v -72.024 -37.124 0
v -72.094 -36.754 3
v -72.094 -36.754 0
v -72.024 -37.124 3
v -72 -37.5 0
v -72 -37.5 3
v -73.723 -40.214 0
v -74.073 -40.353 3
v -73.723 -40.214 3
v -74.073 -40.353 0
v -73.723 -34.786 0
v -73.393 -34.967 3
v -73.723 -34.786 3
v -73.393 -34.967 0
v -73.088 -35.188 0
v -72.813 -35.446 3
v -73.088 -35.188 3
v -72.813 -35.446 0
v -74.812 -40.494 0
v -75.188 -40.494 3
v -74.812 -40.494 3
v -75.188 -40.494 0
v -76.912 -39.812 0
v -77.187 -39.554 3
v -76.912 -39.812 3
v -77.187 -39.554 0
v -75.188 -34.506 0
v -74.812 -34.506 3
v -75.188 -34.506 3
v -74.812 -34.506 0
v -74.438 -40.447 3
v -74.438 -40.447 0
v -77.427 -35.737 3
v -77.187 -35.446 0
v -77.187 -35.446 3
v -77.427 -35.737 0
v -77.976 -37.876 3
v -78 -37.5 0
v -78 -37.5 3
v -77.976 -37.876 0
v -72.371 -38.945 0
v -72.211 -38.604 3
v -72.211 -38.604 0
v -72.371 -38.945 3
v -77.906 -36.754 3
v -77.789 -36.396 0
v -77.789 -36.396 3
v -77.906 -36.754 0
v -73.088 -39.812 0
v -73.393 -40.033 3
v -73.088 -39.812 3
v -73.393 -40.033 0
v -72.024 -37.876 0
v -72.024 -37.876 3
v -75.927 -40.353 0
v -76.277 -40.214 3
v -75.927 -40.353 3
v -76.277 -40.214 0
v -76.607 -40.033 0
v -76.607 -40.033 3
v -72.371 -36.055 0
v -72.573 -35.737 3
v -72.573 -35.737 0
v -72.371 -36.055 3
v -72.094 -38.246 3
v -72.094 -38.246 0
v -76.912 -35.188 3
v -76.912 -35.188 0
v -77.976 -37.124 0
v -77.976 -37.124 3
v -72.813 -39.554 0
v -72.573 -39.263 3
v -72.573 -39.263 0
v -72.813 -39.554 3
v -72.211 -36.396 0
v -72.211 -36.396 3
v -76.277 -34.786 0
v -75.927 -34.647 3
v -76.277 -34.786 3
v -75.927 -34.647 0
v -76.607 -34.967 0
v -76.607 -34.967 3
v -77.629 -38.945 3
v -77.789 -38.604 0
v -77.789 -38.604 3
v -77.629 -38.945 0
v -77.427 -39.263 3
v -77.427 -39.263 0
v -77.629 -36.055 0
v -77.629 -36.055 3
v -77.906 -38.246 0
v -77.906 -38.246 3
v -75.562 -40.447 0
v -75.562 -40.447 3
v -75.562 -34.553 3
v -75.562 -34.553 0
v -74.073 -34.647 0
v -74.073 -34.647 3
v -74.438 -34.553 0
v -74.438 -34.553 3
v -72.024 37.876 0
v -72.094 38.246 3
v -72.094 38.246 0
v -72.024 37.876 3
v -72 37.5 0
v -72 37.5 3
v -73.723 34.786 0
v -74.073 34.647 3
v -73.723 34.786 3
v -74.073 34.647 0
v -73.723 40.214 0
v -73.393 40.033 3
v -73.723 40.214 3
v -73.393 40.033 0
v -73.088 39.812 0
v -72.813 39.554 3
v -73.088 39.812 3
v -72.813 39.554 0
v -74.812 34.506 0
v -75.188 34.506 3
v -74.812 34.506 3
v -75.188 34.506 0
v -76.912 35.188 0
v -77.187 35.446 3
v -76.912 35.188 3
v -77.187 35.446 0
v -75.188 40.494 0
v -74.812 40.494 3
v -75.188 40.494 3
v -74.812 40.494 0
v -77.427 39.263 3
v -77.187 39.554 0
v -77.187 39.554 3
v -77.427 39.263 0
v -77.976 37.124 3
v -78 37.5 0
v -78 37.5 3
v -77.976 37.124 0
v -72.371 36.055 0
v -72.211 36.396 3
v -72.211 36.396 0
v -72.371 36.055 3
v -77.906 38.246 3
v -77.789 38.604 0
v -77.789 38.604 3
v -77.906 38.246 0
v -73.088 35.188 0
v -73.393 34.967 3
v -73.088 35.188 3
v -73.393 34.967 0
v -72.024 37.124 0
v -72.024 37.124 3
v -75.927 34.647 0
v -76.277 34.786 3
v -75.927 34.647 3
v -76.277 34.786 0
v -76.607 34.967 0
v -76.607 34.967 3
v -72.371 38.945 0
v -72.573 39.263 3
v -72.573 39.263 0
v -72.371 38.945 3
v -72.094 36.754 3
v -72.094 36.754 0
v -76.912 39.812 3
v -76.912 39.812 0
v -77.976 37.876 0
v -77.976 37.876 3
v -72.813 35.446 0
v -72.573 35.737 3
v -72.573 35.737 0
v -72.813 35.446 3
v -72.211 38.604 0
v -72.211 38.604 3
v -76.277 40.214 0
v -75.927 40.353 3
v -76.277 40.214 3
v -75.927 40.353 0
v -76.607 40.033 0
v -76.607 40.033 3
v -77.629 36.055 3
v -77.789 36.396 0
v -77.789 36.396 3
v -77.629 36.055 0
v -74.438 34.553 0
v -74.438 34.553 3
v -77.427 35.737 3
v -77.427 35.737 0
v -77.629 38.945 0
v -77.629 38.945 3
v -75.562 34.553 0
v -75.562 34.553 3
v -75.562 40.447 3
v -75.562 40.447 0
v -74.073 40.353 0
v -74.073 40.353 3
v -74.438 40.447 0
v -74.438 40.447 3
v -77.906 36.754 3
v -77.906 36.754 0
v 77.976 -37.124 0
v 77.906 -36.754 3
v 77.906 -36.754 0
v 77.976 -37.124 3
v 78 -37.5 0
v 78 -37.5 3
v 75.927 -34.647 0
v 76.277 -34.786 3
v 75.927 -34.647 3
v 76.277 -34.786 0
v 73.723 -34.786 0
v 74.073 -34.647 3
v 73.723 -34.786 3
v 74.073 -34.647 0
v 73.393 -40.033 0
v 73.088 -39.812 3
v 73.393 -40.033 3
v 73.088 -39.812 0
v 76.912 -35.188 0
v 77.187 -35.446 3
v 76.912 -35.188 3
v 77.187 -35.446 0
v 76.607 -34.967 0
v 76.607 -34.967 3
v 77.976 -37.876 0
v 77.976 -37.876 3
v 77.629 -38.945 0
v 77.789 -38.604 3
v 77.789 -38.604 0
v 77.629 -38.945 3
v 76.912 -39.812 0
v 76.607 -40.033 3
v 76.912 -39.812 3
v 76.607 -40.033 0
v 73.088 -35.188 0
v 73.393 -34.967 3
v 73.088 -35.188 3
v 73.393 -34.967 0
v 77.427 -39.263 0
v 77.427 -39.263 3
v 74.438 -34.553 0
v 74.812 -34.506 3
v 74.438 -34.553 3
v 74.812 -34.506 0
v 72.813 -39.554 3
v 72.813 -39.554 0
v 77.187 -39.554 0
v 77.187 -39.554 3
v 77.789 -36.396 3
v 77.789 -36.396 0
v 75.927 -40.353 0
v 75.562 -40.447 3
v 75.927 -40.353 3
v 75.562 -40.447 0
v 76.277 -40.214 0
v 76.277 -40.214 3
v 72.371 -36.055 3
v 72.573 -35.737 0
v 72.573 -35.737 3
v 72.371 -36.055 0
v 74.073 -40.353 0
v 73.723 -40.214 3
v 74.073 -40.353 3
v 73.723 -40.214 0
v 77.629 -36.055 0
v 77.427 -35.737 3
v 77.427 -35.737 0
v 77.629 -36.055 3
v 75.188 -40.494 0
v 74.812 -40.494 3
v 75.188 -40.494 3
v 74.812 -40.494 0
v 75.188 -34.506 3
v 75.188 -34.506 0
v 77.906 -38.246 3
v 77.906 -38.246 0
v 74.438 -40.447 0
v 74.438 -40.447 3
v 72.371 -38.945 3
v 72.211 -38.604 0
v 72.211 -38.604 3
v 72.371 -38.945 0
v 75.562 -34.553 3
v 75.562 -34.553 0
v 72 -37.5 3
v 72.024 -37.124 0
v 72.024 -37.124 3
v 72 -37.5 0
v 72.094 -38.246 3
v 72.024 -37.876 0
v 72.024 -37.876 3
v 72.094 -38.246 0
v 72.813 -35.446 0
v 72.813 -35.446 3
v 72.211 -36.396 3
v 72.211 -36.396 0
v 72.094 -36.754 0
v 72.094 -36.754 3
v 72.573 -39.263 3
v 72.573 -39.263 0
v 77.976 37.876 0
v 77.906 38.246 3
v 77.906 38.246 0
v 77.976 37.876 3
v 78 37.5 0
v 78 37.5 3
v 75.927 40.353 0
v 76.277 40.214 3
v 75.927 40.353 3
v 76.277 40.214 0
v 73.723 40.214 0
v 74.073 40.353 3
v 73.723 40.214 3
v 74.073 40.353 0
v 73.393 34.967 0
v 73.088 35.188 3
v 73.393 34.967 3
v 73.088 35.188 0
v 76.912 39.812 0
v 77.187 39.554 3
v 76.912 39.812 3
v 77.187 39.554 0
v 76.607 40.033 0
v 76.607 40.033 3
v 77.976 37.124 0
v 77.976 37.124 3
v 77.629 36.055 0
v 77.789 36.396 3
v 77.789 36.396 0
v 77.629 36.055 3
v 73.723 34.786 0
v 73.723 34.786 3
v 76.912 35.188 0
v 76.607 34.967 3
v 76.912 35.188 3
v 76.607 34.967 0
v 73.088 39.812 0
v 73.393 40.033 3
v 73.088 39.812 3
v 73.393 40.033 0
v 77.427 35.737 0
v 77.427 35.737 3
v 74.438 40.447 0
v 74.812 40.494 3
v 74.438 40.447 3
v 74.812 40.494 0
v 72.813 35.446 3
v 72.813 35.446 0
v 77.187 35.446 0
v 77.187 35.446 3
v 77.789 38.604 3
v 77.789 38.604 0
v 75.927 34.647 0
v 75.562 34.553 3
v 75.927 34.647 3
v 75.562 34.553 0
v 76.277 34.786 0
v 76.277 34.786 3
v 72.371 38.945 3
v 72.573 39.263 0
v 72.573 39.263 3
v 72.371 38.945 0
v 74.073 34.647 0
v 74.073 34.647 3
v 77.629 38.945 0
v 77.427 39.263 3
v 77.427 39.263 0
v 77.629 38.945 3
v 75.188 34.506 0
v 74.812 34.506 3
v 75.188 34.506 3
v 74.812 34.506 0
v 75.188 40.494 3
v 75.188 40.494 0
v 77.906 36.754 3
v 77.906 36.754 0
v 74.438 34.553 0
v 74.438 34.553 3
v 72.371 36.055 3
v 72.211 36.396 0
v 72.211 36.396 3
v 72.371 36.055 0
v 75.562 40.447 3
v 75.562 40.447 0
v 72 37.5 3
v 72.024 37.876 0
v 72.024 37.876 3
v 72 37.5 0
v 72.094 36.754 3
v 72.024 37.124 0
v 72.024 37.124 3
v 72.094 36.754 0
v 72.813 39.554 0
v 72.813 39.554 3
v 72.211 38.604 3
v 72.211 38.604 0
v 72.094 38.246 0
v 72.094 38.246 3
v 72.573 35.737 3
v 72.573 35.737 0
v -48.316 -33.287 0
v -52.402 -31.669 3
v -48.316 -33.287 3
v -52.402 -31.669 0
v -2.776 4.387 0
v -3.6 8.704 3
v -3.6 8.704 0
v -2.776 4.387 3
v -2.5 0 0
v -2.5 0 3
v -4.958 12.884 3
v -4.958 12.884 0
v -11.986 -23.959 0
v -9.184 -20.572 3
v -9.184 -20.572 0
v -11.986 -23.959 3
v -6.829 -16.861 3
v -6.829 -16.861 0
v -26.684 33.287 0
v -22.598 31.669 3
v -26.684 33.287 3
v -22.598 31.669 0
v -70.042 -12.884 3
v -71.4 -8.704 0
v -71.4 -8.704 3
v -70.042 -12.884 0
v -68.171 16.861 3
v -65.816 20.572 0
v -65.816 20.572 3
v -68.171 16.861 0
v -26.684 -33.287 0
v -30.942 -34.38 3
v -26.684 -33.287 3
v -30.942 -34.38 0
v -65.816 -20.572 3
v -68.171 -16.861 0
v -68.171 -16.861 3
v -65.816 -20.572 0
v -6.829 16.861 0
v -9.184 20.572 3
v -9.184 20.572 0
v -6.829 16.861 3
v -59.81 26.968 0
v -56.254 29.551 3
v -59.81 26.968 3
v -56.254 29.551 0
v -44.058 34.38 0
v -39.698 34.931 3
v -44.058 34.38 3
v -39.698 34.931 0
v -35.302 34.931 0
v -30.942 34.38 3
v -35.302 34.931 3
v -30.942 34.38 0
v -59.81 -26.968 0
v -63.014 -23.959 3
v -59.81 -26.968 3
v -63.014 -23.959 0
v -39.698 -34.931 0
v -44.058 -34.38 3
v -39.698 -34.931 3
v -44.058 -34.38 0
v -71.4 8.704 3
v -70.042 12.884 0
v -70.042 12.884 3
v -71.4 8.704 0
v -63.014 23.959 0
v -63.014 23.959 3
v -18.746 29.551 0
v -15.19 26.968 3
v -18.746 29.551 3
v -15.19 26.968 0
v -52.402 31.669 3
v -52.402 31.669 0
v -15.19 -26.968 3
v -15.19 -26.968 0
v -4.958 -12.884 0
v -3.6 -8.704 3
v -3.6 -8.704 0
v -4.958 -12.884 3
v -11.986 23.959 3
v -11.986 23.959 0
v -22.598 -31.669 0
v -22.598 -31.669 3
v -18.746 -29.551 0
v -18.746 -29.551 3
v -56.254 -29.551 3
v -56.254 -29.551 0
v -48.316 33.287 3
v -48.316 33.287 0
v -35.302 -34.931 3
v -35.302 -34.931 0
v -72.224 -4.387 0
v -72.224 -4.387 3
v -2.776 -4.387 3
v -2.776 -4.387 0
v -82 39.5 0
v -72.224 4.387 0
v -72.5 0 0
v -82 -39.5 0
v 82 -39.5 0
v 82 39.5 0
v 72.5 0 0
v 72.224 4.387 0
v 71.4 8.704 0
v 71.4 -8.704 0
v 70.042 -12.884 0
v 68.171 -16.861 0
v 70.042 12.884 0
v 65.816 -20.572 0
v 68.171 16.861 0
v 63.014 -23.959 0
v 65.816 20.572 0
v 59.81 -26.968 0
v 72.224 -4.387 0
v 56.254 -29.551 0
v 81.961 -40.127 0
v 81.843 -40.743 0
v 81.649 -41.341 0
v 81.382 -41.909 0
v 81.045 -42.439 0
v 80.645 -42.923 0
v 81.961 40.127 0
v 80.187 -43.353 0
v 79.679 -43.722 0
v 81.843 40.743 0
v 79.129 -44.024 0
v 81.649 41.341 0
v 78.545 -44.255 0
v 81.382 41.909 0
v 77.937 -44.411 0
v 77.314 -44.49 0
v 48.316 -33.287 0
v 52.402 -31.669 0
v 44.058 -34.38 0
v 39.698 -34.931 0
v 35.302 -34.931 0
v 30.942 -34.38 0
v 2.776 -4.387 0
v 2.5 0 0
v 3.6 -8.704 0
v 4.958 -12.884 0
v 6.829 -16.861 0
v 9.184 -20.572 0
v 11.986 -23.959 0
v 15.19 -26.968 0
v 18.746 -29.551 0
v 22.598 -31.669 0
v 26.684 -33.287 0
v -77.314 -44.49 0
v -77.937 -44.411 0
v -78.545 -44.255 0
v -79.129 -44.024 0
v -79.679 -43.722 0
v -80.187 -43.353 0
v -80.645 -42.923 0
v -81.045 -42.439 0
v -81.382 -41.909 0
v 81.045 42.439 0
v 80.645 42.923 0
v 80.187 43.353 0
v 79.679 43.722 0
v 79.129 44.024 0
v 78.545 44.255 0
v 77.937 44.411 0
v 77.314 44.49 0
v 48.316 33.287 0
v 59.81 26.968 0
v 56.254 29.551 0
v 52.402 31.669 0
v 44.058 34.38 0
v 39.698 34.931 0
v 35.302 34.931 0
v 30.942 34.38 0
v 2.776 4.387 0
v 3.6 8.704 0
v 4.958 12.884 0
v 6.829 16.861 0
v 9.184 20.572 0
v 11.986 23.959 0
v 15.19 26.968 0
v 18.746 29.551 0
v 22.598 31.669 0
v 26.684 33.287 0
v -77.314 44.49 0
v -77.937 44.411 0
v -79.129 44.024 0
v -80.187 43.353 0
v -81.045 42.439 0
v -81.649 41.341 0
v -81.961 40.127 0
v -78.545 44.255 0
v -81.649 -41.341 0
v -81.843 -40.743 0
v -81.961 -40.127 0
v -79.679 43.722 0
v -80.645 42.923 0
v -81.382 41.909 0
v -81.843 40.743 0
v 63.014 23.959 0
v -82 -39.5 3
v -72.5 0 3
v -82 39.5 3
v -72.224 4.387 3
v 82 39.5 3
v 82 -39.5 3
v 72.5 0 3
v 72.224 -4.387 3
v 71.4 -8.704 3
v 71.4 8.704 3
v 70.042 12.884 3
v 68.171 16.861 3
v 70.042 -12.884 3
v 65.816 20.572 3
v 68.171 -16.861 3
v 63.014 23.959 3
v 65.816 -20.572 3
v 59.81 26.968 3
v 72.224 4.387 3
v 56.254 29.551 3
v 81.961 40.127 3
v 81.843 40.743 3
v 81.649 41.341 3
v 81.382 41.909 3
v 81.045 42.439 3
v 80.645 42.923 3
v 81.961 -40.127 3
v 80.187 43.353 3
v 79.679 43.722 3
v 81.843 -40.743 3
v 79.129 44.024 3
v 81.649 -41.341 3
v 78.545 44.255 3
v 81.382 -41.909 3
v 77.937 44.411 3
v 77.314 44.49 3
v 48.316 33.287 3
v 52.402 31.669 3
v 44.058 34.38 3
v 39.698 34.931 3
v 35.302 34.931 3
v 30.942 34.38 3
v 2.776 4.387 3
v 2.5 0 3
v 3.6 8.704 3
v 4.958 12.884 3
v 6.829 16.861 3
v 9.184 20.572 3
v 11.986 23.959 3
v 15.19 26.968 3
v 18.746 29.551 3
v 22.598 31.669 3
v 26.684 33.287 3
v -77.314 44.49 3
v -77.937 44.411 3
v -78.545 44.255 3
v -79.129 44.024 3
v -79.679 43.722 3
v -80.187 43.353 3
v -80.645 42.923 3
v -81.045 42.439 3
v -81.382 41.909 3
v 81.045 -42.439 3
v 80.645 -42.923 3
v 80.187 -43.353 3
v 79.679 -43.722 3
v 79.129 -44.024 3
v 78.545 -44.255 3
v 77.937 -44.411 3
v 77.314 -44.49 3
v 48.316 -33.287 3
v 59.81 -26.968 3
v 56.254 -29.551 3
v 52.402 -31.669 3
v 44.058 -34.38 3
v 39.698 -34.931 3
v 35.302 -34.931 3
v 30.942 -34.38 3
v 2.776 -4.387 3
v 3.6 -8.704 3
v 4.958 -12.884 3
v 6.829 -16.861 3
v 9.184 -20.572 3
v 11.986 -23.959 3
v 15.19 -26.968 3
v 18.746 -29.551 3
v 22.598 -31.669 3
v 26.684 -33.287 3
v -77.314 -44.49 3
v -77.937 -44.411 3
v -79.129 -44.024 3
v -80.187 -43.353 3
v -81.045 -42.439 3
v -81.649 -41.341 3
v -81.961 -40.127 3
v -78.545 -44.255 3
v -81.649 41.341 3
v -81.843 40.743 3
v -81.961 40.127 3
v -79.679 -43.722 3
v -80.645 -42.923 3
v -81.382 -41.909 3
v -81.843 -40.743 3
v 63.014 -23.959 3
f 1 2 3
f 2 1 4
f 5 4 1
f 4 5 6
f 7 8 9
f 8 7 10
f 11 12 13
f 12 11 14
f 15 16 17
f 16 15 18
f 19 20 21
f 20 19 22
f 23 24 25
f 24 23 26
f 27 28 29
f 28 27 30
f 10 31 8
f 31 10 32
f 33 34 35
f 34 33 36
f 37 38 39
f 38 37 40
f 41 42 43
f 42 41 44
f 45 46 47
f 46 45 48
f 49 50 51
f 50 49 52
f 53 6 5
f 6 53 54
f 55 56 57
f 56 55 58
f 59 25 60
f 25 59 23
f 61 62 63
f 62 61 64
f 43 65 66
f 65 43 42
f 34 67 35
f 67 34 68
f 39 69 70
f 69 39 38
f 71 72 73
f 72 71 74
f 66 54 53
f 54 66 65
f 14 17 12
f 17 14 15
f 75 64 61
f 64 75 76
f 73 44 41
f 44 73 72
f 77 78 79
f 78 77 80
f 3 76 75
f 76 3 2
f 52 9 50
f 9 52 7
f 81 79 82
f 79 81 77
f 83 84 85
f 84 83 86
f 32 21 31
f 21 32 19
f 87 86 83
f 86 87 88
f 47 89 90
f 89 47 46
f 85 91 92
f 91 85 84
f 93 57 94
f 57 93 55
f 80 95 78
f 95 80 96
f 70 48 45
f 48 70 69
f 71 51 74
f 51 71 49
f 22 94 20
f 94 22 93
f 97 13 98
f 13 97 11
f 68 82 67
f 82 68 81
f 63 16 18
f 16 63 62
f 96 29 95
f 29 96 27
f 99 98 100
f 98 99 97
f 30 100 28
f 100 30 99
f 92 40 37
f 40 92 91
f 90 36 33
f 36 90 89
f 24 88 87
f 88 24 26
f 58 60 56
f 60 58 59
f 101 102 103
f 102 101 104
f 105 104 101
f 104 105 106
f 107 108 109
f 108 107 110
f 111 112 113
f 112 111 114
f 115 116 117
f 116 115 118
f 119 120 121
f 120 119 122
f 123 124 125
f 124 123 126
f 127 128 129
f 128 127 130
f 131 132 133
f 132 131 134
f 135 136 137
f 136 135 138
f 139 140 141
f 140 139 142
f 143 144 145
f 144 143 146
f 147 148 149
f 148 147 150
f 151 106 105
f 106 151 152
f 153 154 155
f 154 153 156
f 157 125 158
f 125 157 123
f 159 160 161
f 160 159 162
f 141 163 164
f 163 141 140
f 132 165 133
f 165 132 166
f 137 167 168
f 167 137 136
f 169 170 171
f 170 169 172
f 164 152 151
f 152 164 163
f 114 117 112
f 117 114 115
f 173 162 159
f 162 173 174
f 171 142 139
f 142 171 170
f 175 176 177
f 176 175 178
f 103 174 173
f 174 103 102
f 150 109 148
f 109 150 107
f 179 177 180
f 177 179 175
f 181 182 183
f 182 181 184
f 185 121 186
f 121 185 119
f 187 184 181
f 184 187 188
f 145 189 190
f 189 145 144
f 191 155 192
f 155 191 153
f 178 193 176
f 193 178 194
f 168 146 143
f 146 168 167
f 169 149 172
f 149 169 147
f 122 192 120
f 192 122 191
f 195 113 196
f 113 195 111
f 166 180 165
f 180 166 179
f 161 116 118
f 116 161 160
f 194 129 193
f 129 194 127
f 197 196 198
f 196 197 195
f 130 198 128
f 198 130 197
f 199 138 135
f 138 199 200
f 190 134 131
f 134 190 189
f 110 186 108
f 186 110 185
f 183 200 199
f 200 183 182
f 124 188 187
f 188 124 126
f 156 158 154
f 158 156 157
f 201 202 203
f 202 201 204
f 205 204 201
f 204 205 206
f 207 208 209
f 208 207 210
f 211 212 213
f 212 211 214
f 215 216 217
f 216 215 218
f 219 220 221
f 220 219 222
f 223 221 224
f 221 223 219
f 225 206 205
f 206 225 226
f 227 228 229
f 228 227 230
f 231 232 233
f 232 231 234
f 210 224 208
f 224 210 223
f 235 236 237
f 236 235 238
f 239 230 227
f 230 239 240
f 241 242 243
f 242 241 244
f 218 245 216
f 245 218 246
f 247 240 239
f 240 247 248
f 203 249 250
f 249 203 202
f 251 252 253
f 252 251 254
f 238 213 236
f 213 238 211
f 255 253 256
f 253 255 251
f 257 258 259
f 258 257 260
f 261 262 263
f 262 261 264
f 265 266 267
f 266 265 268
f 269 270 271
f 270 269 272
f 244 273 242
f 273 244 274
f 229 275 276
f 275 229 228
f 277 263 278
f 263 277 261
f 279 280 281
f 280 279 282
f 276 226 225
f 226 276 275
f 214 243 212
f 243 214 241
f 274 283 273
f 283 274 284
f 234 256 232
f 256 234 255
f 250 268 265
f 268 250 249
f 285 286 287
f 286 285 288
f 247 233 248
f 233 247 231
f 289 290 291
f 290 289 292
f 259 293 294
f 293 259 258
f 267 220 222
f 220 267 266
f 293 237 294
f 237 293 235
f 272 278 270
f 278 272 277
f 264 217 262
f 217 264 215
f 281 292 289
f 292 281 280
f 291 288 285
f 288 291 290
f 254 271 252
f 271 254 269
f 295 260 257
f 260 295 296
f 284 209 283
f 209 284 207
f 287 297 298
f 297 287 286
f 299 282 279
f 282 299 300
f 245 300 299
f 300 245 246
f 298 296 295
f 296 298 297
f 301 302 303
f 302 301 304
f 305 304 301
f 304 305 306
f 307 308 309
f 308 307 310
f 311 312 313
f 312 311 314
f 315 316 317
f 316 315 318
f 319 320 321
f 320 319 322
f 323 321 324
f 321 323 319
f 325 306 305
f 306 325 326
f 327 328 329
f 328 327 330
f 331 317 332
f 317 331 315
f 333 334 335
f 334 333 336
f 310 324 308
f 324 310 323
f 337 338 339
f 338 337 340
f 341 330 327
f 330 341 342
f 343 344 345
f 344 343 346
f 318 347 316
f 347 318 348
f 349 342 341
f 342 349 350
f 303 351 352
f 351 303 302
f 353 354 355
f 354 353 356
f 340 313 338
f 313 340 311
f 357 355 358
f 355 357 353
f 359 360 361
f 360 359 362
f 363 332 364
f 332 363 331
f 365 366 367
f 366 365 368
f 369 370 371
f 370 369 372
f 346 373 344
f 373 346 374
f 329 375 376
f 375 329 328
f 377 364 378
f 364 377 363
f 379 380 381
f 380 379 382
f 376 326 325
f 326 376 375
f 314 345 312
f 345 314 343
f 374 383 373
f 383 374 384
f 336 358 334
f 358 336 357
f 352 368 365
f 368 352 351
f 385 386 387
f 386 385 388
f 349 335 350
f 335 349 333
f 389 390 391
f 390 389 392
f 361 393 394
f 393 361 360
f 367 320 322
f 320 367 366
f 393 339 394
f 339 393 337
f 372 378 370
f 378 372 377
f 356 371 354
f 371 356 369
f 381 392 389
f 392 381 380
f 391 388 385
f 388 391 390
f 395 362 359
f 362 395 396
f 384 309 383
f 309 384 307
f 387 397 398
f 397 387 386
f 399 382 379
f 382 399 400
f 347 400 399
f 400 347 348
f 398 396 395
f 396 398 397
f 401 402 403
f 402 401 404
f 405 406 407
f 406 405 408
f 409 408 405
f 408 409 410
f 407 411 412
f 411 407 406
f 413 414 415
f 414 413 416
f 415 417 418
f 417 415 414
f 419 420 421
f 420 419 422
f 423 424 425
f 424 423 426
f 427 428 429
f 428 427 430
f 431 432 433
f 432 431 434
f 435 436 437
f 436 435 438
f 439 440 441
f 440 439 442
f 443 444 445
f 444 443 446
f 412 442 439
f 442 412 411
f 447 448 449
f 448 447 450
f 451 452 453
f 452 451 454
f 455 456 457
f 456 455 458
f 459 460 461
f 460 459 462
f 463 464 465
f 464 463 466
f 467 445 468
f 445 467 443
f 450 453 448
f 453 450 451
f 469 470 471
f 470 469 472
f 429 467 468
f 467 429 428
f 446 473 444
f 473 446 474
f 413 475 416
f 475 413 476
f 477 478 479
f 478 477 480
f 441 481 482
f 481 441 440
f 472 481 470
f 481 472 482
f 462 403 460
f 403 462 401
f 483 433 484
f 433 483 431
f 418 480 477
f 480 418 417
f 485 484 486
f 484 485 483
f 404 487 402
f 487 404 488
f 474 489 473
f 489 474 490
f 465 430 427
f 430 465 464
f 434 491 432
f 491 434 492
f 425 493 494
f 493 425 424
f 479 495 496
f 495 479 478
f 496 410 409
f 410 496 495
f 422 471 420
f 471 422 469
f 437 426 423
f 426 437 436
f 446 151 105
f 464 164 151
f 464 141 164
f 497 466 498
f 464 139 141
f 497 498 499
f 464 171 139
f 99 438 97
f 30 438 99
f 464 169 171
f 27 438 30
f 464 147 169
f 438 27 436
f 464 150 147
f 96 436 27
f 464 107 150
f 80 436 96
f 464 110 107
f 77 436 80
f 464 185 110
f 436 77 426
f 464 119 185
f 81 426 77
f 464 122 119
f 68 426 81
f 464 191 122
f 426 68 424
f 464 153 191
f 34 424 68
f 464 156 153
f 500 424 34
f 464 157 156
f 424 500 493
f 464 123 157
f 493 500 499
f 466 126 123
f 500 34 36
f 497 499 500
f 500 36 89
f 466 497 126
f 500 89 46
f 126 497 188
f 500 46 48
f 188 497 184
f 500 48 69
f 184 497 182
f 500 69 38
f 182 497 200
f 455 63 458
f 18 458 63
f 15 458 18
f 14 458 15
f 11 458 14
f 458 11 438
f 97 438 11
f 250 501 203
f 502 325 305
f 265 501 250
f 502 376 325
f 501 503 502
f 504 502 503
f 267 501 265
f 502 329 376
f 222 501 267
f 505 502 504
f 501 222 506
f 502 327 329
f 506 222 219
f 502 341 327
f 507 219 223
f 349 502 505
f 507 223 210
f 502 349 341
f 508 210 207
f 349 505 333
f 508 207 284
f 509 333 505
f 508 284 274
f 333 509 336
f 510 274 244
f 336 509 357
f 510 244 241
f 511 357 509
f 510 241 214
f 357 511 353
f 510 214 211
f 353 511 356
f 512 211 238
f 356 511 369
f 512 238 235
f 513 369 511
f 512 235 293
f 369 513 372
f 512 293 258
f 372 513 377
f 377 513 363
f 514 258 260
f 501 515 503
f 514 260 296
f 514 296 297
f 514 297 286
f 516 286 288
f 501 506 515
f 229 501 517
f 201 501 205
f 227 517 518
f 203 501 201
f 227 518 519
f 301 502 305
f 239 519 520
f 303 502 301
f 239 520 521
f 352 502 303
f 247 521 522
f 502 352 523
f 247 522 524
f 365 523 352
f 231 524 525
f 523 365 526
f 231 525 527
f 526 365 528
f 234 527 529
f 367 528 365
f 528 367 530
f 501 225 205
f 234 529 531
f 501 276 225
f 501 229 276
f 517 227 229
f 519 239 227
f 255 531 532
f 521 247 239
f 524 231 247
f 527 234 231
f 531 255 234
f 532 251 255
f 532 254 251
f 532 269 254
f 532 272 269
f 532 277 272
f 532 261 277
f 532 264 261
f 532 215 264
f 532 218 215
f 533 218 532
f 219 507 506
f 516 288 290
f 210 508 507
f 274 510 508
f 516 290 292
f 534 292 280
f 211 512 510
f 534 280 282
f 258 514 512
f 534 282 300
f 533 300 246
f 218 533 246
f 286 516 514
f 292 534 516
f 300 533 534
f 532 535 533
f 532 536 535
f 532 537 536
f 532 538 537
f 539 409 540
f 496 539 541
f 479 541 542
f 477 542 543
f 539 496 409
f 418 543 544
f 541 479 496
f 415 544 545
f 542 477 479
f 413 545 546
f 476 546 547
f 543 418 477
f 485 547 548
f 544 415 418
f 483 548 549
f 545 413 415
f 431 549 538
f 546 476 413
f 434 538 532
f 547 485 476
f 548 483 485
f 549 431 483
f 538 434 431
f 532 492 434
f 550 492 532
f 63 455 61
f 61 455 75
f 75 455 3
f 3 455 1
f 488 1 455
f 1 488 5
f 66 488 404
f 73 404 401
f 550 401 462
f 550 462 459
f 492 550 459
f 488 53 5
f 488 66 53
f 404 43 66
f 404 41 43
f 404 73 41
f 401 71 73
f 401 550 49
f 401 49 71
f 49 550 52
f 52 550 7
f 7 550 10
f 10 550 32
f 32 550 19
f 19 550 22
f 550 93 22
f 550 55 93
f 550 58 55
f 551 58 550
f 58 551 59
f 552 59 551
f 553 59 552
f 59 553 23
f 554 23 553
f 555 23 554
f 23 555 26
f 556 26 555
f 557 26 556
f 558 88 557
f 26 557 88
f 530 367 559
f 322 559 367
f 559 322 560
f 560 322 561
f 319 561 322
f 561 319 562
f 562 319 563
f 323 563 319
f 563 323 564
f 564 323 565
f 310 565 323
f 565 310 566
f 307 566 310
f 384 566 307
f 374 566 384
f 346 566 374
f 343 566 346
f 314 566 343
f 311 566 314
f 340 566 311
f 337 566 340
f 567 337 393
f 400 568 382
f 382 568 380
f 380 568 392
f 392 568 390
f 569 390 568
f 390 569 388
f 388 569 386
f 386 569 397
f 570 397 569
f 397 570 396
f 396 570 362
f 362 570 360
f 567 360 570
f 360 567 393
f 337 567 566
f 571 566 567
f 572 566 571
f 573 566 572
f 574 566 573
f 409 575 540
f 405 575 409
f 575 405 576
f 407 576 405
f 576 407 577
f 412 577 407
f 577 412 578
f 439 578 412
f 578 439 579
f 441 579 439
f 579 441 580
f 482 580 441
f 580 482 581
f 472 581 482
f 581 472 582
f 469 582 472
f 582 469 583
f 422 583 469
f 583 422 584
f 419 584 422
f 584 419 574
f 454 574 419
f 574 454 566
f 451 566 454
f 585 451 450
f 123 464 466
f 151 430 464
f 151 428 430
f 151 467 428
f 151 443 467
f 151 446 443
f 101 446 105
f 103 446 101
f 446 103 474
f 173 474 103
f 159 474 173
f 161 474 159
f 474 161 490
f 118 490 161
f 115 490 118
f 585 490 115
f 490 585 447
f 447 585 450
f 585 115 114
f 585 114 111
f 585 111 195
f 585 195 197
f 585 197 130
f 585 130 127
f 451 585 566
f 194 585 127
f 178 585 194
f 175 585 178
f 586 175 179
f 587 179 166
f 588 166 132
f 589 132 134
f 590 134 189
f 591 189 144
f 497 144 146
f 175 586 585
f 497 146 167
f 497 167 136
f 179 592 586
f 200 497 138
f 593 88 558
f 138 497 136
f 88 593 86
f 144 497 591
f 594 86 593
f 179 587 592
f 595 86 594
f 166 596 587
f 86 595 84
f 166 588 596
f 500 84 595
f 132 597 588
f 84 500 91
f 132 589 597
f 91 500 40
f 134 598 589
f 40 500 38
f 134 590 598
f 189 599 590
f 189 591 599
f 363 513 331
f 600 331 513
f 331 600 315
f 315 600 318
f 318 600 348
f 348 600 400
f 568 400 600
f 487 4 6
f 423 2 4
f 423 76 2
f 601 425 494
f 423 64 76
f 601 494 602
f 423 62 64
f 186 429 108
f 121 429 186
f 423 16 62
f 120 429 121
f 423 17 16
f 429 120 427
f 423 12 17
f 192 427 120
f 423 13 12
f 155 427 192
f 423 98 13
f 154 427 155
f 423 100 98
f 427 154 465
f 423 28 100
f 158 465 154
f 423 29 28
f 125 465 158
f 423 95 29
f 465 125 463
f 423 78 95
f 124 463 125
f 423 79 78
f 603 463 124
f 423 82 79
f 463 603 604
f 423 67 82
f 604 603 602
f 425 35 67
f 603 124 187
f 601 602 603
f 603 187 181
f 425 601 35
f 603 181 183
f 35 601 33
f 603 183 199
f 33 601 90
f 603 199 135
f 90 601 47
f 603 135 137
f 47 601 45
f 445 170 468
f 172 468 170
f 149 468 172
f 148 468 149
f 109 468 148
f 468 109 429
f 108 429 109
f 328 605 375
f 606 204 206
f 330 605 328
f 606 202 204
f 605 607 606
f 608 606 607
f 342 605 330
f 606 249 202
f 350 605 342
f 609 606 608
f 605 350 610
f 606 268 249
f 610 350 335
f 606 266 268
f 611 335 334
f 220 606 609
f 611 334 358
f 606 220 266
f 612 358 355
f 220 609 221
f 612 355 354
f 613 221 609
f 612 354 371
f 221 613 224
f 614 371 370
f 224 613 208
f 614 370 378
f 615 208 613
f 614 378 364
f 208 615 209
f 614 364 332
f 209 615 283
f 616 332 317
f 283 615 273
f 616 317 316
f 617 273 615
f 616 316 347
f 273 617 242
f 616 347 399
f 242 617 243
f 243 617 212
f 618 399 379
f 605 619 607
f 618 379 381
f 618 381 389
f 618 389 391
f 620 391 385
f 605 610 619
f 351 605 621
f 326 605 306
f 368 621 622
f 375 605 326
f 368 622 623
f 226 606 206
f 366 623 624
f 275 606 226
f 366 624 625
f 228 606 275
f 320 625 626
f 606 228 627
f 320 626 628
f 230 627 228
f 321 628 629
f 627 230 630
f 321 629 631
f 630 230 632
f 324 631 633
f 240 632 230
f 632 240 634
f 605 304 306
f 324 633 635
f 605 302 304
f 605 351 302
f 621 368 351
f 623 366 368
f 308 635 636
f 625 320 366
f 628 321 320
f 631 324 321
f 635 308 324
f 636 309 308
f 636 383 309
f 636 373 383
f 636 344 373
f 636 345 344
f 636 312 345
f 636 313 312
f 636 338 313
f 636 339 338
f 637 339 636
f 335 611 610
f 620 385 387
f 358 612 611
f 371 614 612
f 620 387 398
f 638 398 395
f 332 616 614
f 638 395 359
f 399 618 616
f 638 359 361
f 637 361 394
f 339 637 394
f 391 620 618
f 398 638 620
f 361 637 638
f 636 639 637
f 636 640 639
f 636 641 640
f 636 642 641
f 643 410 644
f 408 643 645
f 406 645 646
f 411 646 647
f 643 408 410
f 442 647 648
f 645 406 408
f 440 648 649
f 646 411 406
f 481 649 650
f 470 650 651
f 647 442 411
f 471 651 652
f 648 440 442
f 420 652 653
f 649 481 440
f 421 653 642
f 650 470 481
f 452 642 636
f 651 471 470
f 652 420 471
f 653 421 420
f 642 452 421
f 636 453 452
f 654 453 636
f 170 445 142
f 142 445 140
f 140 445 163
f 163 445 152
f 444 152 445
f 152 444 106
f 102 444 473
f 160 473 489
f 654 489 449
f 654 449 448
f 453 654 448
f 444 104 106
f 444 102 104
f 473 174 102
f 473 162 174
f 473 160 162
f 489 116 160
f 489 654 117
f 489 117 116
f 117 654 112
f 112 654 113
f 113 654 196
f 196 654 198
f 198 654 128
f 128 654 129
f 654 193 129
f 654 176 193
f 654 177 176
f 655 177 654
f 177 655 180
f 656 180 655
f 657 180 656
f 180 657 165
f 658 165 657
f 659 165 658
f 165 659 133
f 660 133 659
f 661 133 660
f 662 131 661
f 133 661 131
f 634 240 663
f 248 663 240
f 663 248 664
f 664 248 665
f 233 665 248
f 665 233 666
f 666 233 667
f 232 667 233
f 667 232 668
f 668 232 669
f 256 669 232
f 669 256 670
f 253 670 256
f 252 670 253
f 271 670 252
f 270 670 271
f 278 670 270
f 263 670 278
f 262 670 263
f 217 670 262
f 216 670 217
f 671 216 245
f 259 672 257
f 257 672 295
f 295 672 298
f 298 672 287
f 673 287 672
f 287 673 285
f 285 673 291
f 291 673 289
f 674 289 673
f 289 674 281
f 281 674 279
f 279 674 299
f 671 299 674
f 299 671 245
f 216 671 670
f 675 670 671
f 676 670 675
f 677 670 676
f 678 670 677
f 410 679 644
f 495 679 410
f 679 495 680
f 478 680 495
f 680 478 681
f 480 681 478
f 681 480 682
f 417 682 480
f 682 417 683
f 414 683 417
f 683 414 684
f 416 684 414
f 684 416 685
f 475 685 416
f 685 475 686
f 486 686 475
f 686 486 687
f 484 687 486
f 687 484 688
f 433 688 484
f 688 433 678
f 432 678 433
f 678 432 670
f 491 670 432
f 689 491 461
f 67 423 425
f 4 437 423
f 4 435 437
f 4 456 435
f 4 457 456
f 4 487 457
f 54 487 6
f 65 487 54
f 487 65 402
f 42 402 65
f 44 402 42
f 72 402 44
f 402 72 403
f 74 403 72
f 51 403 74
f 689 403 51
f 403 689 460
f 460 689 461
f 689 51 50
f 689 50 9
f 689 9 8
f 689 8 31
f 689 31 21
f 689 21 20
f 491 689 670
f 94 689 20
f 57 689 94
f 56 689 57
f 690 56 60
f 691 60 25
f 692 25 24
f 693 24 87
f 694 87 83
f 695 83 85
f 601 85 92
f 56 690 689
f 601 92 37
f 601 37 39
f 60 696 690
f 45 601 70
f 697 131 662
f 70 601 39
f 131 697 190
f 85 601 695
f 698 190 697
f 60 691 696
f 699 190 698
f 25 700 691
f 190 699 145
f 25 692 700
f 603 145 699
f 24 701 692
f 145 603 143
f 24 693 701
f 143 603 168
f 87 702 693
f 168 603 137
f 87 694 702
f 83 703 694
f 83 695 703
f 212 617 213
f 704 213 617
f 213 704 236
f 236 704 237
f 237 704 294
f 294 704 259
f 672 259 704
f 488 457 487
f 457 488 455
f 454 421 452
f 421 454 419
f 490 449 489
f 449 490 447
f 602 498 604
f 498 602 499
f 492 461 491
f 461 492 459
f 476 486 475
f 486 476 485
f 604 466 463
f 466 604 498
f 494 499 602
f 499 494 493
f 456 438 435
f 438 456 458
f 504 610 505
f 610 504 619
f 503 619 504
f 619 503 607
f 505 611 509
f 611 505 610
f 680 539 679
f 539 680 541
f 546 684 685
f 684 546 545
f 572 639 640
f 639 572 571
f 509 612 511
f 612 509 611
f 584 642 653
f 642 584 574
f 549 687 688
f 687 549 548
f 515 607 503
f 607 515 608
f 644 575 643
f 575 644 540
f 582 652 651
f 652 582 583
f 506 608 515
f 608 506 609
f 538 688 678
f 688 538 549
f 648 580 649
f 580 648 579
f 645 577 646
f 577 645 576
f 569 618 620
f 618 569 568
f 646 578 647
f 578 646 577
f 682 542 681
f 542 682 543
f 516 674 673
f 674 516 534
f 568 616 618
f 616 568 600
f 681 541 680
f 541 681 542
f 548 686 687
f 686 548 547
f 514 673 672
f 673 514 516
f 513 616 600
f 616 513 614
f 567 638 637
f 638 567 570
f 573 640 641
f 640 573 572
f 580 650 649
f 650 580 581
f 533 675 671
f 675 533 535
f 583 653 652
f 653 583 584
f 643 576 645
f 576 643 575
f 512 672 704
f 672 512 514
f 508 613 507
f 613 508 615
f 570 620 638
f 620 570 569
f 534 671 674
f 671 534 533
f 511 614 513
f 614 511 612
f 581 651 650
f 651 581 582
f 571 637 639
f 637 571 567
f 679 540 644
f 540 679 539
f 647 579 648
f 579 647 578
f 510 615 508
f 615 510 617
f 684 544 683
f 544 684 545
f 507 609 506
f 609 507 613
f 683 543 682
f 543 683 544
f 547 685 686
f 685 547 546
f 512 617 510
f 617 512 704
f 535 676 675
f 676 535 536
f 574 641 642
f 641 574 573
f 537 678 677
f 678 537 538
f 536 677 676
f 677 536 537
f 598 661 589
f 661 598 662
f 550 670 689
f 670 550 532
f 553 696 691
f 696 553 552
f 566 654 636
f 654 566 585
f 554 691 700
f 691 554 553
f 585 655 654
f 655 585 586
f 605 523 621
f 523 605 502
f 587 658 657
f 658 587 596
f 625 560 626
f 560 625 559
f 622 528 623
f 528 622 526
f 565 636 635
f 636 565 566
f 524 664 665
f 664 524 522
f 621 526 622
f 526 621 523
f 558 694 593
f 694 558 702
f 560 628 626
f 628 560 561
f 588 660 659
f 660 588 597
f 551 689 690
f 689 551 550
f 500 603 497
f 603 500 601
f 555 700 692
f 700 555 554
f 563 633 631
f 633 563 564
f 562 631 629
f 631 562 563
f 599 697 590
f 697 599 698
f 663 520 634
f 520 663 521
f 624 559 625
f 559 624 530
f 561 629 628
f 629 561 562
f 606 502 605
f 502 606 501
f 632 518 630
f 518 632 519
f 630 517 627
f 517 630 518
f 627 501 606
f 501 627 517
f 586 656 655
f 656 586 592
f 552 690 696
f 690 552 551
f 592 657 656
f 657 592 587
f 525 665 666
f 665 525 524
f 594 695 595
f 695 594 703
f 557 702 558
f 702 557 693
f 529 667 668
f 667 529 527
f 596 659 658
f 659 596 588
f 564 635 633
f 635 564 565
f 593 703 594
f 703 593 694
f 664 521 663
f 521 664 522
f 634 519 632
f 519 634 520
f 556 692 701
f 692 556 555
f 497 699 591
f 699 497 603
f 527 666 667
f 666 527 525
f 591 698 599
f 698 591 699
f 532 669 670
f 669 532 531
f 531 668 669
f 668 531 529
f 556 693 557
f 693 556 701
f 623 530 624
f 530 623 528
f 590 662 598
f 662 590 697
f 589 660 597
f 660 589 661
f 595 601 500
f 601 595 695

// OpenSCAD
$fn = 50;


difference() {
	union() {
		hull() {
			translate(v = [-77.0000000000, 39.5000000000, 0]) {
				cylinder(h = 3, r = 5);
			}
			translate(v = [77.0000000000, 39.5000000000, 0]) {
				cylinder(h = 3, r = 5);
			}
			translate(v = [-77.0000000000, -39.5000000000, 0]) {
				cylinder(h = 3, r = 5);
			}
			translate(v = [77.0000000000, -39.5000000000, 0]) {
				cylinder(h = 3, r = 5);
			}
		}
	}
	union() {
		#translate(v = [-75.0000000000, -37.5000000000, -100.0000000000]) {
			cylinder(h = 200, r = 3.0000000000);
		}
		#translate(v = [-75.0000000000, 37.5000000000, -100.0000000000]) {
			cylinder(h = 200, r = 3.0000000000);
		}
		#translate(v = [75.0000000000, -37.5000000000, -100.0000000000]) {
			cylinder(h = 200, r = 3.0000000000);
		}
		#translate(v = [75.0000000000, 37.5000000000, -100.0000000000]) {
			cylinder(h = 200, r = 3.0000000000);
		}
		#translate(v = [-37.5000000000, 0, 0]) {
			cylinder(h = 3, r = 35.0000000000);
		}
		#translate(v = [37.5000000000, 0, 0]) {
			cylinder(h = 3, r = 35.0000000000);
		}
	}
}
